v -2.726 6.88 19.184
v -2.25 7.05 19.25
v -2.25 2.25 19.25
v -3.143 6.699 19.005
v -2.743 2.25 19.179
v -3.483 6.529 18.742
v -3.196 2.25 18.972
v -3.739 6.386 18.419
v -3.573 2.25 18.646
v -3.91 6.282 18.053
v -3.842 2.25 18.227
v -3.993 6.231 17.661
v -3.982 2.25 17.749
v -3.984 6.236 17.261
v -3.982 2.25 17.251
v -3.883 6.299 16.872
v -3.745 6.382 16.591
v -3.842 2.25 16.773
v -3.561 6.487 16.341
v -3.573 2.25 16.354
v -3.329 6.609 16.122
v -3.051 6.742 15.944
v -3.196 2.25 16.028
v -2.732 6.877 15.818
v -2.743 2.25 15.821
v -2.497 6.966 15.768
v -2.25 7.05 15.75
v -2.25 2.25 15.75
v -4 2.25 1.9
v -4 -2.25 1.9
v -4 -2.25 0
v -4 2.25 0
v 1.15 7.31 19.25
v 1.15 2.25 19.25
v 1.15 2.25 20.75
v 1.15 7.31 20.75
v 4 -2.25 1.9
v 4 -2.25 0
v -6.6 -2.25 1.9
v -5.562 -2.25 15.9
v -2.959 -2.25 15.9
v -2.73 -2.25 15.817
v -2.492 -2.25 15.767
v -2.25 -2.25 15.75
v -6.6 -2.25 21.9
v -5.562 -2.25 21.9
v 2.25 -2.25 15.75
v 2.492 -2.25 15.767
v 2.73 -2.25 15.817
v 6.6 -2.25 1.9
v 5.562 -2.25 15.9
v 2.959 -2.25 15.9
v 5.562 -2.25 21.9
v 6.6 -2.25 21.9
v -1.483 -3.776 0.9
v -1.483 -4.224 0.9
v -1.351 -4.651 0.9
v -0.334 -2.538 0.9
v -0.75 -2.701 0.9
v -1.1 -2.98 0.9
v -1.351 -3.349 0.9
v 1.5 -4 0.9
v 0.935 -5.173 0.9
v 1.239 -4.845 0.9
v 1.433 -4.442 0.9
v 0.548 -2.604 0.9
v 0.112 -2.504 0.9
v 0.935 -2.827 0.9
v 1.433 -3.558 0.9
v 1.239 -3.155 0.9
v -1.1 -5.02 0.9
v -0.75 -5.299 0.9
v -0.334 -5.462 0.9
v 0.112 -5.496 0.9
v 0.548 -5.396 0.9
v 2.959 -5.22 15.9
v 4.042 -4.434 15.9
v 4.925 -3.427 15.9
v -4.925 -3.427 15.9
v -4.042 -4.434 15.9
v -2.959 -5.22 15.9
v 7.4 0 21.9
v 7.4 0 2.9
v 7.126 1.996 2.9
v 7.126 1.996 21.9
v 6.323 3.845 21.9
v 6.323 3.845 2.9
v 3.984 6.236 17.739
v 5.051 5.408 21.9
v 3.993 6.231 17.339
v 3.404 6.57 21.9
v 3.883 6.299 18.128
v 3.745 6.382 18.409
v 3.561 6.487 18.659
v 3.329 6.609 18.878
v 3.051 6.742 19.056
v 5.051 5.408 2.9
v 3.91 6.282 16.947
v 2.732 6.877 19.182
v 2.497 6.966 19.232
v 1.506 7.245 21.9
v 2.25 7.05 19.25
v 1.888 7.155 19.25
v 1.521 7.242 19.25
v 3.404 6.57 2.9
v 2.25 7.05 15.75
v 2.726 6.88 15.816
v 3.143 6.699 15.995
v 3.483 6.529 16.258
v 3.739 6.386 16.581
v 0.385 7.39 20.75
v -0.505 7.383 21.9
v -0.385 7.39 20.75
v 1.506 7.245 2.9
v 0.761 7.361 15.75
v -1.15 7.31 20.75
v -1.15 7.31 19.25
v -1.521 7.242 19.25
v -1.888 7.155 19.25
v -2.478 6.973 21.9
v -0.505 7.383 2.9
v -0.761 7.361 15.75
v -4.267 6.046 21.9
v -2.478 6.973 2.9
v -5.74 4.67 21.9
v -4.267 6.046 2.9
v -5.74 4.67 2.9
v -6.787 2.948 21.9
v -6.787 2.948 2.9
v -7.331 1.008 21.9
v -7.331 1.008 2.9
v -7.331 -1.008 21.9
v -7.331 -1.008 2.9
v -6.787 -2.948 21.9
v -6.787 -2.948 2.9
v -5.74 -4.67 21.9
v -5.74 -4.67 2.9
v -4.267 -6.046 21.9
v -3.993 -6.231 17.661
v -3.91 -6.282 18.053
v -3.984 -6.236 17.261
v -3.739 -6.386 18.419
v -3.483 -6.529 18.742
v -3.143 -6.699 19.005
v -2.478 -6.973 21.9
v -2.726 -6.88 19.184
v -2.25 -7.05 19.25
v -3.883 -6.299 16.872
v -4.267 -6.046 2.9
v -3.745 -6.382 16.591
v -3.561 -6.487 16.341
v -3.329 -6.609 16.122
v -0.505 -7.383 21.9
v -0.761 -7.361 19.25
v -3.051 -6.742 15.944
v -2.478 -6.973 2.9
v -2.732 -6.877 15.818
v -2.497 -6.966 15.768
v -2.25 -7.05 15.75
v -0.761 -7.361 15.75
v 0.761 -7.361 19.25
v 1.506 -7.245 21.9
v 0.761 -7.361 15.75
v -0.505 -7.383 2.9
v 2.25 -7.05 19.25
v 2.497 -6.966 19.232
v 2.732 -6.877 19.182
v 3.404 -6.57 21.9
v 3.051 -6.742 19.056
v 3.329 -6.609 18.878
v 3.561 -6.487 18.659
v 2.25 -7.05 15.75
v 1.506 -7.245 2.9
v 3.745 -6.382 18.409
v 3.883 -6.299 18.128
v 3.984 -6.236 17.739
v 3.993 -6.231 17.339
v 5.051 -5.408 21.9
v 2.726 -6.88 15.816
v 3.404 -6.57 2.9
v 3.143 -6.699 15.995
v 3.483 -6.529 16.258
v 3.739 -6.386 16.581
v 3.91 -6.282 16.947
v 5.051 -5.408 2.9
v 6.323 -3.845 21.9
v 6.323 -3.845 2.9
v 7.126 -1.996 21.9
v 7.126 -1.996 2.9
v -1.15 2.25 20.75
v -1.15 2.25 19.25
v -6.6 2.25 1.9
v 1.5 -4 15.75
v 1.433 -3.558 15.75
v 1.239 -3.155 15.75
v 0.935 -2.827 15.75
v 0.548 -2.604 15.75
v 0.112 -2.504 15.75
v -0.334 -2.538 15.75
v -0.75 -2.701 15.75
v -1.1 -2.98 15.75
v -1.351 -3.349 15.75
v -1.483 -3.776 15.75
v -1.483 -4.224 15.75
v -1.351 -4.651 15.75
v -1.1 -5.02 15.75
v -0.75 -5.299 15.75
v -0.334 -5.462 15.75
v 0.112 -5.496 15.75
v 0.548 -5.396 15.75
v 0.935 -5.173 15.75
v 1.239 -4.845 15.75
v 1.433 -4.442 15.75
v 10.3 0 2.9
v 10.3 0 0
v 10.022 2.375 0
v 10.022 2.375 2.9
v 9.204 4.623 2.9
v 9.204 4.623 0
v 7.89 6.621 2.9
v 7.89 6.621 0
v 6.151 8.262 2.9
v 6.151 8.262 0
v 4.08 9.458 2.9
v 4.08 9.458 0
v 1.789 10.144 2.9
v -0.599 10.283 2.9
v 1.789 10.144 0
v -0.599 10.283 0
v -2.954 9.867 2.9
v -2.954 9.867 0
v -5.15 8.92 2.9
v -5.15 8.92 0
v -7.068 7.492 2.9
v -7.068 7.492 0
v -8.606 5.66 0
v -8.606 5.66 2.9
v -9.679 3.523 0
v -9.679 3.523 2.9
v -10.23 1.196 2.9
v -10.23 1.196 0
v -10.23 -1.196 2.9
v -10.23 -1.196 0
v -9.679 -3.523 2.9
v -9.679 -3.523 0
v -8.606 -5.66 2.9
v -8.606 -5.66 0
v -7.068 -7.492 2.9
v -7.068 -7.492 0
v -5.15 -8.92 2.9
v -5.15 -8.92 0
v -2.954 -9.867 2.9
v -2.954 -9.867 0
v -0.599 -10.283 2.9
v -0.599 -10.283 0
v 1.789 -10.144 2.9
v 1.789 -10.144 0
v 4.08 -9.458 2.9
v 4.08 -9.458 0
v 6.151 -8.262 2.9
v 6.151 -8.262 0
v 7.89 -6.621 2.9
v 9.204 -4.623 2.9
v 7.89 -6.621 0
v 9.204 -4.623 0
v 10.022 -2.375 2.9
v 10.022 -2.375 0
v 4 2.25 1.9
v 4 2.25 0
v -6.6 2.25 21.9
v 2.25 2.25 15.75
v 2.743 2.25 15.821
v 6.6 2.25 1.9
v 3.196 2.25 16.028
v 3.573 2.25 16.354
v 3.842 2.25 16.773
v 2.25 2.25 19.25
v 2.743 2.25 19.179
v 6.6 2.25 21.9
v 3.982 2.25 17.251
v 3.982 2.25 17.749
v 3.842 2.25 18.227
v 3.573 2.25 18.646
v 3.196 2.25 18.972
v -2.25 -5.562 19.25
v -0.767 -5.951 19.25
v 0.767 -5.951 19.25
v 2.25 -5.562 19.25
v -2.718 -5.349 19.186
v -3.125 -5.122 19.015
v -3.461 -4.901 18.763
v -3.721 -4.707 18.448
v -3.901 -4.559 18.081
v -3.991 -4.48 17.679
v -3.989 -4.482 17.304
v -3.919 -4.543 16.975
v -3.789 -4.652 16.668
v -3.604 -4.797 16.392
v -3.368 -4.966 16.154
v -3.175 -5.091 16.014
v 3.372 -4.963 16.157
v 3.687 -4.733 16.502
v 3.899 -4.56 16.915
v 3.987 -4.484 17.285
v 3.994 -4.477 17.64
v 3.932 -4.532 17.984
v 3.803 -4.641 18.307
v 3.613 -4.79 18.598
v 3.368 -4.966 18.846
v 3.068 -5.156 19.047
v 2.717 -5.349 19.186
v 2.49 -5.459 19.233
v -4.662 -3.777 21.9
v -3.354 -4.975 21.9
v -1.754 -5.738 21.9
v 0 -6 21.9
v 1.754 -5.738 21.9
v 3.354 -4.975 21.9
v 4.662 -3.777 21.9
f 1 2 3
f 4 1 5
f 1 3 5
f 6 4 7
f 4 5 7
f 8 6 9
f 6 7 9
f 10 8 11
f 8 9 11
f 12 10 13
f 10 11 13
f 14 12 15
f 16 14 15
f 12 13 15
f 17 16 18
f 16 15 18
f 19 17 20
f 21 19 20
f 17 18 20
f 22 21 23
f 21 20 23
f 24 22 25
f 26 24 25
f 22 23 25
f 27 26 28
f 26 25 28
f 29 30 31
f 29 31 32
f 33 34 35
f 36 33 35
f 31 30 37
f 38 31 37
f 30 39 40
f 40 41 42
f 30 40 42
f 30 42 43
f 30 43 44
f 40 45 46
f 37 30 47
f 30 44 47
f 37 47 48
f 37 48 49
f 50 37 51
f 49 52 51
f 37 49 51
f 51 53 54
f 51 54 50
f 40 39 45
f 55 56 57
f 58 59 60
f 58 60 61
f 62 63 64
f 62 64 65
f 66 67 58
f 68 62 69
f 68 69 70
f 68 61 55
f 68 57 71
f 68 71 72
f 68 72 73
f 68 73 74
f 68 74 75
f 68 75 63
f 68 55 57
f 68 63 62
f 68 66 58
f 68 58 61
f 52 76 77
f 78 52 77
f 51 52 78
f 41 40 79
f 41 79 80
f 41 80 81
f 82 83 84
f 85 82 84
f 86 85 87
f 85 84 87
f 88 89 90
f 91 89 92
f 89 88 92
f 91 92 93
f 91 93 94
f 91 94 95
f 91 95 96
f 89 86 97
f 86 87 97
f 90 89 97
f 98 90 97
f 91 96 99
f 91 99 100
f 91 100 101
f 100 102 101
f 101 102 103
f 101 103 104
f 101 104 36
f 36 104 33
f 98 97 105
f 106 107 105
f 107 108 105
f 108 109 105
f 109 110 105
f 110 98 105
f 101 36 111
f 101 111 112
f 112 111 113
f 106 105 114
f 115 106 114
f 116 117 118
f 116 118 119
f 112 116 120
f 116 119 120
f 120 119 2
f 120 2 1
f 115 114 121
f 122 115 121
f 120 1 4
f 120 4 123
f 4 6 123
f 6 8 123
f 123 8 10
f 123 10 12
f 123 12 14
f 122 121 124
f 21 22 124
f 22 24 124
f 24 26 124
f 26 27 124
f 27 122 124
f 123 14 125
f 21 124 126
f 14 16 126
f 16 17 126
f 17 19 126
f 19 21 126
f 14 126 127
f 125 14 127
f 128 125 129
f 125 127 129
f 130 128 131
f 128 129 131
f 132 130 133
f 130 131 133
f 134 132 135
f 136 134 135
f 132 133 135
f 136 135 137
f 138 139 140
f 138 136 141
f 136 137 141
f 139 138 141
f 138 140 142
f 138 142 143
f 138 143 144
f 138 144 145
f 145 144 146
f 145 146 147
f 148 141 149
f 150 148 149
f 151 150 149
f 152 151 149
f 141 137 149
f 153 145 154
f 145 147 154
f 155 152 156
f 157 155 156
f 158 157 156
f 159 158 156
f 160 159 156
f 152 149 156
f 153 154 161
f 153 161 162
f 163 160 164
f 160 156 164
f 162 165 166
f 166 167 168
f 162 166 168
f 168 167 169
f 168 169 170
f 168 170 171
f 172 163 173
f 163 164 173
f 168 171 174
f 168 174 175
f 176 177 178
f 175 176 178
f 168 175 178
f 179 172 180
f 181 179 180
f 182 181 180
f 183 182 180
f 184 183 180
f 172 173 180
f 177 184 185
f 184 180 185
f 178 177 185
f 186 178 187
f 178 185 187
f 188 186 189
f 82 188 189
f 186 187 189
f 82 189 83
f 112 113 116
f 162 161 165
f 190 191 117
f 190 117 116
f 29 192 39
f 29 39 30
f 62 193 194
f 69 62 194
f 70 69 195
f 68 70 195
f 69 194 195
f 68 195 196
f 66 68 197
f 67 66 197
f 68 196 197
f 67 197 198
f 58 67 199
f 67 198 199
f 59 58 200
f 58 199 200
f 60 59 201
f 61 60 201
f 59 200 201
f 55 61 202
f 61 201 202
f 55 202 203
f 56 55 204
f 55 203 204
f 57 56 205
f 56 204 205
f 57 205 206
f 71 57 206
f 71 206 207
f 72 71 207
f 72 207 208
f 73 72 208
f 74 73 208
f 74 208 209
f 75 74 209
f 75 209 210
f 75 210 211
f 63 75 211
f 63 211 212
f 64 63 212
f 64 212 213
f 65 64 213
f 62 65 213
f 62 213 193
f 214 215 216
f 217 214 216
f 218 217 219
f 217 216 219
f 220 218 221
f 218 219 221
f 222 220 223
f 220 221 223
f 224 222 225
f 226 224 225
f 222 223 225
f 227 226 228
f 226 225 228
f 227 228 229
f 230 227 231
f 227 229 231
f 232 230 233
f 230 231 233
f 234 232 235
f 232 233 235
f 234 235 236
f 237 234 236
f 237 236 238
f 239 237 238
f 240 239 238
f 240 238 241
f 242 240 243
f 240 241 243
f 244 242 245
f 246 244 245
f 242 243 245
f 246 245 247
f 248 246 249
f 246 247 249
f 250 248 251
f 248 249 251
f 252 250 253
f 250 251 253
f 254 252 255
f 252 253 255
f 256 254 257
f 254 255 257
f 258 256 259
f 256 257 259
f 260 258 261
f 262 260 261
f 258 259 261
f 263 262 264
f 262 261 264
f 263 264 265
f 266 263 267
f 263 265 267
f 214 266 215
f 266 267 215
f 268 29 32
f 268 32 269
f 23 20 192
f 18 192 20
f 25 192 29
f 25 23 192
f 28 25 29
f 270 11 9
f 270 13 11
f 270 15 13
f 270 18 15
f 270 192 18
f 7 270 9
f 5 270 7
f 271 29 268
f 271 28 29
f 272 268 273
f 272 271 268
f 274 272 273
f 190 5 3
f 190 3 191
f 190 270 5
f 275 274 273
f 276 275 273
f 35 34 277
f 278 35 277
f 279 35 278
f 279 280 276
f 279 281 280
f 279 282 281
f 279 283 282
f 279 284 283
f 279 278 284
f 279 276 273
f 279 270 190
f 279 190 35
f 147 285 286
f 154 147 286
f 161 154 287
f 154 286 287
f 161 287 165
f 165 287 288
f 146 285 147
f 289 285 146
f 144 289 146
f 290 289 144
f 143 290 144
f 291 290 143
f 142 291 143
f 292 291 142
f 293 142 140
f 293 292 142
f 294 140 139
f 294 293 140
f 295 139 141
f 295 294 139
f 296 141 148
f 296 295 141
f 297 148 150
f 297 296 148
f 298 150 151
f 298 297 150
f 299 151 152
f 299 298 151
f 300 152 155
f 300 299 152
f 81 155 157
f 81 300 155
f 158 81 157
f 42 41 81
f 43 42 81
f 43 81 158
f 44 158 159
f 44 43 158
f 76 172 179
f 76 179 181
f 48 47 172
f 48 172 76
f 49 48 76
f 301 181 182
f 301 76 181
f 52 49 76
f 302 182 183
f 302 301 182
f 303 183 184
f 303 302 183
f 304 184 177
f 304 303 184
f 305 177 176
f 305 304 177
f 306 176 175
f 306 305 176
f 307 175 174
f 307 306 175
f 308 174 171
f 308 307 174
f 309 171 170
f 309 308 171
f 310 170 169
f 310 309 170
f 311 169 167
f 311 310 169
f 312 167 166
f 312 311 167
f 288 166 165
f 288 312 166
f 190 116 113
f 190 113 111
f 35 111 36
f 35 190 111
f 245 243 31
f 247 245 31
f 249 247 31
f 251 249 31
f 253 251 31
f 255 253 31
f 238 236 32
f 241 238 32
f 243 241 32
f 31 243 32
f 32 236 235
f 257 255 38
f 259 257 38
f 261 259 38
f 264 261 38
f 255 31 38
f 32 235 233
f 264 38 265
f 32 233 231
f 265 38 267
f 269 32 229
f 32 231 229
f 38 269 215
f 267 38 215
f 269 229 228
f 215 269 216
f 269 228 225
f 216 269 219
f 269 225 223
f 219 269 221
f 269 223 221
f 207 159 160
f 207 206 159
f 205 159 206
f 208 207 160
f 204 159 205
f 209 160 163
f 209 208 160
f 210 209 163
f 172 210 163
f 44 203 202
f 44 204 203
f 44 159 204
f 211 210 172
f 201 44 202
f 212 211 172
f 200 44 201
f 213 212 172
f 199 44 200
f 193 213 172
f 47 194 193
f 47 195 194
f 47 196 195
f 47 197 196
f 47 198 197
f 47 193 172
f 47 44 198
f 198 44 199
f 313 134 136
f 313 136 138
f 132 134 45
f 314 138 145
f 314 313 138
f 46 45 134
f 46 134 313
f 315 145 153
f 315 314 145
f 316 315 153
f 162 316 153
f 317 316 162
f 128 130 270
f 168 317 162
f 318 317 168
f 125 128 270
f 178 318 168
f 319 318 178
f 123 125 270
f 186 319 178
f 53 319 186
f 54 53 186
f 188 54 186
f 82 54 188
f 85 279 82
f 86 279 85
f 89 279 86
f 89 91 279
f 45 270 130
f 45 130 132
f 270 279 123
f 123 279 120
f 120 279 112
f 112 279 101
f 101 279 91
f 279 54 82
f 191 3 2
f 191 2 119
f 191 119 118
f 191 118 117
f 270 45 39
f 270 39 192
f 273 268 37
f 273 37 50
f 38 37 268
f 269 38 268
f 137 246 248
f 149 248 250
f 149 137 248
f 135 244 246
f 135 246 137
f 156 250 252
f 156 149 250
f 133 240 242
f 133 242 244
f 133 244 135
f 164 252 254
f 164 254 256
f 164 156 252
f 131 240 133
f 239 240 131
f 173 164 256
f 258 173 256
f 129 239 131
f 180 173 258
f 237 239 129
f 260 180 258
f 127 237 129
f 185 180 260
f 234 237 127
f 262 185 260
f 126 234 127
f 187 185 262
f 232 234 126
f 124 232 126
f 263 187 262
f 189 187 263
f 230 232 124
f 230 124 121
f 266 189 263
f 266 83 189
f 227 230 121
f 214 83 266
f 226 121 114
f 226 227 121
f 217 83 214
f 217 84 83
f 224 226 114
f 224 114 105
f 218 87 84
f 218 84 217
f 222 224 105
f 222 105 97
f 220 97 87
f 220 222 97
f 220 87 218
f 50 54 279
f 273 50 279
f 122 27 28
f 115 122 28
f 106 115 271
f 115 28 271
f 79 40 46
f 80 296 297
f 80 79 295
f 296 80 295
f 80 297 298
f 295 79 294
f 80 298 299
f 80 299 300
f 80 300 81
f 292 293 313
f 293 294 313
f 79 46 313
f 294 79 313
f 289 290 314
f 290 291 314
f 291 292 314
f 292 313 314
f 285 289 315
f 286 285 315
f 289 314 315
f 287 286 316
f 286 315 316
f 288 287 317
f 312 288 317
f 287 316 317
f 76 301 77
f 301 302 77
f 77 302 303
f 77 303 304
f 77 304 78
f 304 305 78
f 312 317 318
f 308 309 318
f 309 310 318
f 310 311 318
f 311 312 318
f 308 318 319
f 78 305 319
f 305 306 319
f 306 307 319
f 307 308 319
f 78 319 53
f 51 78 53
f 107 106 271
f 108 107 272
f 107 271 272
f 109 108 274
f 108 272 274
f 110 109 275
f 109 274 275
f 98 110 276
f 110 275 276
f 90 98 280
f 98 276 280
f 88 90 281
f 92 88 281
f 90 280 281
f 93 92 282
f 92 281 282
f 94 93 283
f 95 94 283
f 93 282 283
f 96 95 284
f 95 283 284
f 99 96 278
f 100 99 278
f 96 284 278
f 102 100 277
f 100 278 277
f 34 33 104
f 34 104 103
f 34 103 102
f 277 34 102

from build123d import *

# Parameters (mm, degrees)
SKETCH_R             = 10.3
PAD_DEPTH            = 2.9
SKETCH001_R          = 7.4
PAD001_DEPTH         = 19
SKETCH002_W          = 13.2
SKETCH002_H          = 4.5
POCKET_DEPTH         = 20
SKETCH003_W          = 8
SKETCH003_H          = 4.5
POCKET001_DEPTH      = 1.901
POCKET002_DEPTH      = 6
SKETCH005_R          = 1.5
POCKET003_DEPTH      = 15
POCKET004_DEPTH      = 20
POCKET004_DEPTH_BACK = -20
SKETCH007_W          = 2.3
SKETCH007_H          = 1.5
POCKET005_DEPTH      = 10.301


with BuildPart() as part:
    # Sketch → Pad (new body)
    with BuildSketch(Plane.XY):
        Circle(SKETCH_R)
    extrude(amount=PAD_DEPTH)

    # Sketch001 (on Face3 of Pad) → Pad001 (join)
    with BuildSketch(Plane.XY.offset(2.9)):
        Circle(SKETCH001_R)
    extrude(amount=PAD001_DEPTH)

    # Sketch002 (on Face5 of Pad001) → Pocket (cut)
    with BuildSketch(Plane.XY.offset(21.9)):
        Rectangle(SKETCH002_W, SKETCH002_H)
    extrude(amount=-POCKET_DEPTH, mode=Mode.SUBTRACT)

    # Sketch003 (on Face10 of Pocket) → Pocket001 (cut, through all)
    with BuildSketch(Plane.XY.offset(1.9)):
        Rectangle(SKETCH003_W, SKETCH003_H)
    extrude(amount=-POCKET001_DEPTH, mode=Mode.SUBTRACT)

    # Sketch004 (on Face9 of Pocket001) → Pocket002 (cut)
    with BuildSketch(Plane.XY.offset(21.9)):
        with BuildLine():
            ThreePointArc((-6, 0), (0, -6), (6, 0))
            Line((-6, 0), (6, 0))
        make_face()
    extrude(amount=-POCKET002_DEPTH, mode=Mode.SUBTRACT)

    # Sketch005 (on Face13 of Pocket002) → Pocket003 (cut)
    with BuildSketch(Plane.XY.offset(15.9)):
        with Locations((0, -4)):
            Circle(SKETCH005_R)
    extrude(amount=-POCKET003_DEPTH, mode=Mode.SUBTRACT)

    # Sketch006 → Pocket004 (cut, two sides)
    with BuildSketch(Plane.XZ) as pocket004_sk:
        with BuildLine():
            ThreePointArc((-2.25, 19.25), (-4, 17.5), (-2.25, 15.75))
            Line((-2.25, 15.75), (2.25, 15.75))
            ThreePointArc((2.25, 15.75), (4, 17.5), (2.25, 19.25))
            Line((-2.25, 19.25), (2.25, 19.25))
        make_face()
    extrude(amount=-POCKET004_DEPTH, mode=Mode.SUBTRACT)
    extrude(pocket004_sk.sketch, amount=-POCKET004_DEPTH_BACK, mode=Mode.SUBTRACT)

    # Sketch007 → Pocket005 (cut, through all)
    with BuildSketch(Plane.XZ):
        with Locations((0, 20)):
            Rectangle(SKETCH007_W, SKETCH007_H)
    extrude(amount=-POCKET005_DEPTH, mode=Mode.SUBTRACT)


solid = part.part
